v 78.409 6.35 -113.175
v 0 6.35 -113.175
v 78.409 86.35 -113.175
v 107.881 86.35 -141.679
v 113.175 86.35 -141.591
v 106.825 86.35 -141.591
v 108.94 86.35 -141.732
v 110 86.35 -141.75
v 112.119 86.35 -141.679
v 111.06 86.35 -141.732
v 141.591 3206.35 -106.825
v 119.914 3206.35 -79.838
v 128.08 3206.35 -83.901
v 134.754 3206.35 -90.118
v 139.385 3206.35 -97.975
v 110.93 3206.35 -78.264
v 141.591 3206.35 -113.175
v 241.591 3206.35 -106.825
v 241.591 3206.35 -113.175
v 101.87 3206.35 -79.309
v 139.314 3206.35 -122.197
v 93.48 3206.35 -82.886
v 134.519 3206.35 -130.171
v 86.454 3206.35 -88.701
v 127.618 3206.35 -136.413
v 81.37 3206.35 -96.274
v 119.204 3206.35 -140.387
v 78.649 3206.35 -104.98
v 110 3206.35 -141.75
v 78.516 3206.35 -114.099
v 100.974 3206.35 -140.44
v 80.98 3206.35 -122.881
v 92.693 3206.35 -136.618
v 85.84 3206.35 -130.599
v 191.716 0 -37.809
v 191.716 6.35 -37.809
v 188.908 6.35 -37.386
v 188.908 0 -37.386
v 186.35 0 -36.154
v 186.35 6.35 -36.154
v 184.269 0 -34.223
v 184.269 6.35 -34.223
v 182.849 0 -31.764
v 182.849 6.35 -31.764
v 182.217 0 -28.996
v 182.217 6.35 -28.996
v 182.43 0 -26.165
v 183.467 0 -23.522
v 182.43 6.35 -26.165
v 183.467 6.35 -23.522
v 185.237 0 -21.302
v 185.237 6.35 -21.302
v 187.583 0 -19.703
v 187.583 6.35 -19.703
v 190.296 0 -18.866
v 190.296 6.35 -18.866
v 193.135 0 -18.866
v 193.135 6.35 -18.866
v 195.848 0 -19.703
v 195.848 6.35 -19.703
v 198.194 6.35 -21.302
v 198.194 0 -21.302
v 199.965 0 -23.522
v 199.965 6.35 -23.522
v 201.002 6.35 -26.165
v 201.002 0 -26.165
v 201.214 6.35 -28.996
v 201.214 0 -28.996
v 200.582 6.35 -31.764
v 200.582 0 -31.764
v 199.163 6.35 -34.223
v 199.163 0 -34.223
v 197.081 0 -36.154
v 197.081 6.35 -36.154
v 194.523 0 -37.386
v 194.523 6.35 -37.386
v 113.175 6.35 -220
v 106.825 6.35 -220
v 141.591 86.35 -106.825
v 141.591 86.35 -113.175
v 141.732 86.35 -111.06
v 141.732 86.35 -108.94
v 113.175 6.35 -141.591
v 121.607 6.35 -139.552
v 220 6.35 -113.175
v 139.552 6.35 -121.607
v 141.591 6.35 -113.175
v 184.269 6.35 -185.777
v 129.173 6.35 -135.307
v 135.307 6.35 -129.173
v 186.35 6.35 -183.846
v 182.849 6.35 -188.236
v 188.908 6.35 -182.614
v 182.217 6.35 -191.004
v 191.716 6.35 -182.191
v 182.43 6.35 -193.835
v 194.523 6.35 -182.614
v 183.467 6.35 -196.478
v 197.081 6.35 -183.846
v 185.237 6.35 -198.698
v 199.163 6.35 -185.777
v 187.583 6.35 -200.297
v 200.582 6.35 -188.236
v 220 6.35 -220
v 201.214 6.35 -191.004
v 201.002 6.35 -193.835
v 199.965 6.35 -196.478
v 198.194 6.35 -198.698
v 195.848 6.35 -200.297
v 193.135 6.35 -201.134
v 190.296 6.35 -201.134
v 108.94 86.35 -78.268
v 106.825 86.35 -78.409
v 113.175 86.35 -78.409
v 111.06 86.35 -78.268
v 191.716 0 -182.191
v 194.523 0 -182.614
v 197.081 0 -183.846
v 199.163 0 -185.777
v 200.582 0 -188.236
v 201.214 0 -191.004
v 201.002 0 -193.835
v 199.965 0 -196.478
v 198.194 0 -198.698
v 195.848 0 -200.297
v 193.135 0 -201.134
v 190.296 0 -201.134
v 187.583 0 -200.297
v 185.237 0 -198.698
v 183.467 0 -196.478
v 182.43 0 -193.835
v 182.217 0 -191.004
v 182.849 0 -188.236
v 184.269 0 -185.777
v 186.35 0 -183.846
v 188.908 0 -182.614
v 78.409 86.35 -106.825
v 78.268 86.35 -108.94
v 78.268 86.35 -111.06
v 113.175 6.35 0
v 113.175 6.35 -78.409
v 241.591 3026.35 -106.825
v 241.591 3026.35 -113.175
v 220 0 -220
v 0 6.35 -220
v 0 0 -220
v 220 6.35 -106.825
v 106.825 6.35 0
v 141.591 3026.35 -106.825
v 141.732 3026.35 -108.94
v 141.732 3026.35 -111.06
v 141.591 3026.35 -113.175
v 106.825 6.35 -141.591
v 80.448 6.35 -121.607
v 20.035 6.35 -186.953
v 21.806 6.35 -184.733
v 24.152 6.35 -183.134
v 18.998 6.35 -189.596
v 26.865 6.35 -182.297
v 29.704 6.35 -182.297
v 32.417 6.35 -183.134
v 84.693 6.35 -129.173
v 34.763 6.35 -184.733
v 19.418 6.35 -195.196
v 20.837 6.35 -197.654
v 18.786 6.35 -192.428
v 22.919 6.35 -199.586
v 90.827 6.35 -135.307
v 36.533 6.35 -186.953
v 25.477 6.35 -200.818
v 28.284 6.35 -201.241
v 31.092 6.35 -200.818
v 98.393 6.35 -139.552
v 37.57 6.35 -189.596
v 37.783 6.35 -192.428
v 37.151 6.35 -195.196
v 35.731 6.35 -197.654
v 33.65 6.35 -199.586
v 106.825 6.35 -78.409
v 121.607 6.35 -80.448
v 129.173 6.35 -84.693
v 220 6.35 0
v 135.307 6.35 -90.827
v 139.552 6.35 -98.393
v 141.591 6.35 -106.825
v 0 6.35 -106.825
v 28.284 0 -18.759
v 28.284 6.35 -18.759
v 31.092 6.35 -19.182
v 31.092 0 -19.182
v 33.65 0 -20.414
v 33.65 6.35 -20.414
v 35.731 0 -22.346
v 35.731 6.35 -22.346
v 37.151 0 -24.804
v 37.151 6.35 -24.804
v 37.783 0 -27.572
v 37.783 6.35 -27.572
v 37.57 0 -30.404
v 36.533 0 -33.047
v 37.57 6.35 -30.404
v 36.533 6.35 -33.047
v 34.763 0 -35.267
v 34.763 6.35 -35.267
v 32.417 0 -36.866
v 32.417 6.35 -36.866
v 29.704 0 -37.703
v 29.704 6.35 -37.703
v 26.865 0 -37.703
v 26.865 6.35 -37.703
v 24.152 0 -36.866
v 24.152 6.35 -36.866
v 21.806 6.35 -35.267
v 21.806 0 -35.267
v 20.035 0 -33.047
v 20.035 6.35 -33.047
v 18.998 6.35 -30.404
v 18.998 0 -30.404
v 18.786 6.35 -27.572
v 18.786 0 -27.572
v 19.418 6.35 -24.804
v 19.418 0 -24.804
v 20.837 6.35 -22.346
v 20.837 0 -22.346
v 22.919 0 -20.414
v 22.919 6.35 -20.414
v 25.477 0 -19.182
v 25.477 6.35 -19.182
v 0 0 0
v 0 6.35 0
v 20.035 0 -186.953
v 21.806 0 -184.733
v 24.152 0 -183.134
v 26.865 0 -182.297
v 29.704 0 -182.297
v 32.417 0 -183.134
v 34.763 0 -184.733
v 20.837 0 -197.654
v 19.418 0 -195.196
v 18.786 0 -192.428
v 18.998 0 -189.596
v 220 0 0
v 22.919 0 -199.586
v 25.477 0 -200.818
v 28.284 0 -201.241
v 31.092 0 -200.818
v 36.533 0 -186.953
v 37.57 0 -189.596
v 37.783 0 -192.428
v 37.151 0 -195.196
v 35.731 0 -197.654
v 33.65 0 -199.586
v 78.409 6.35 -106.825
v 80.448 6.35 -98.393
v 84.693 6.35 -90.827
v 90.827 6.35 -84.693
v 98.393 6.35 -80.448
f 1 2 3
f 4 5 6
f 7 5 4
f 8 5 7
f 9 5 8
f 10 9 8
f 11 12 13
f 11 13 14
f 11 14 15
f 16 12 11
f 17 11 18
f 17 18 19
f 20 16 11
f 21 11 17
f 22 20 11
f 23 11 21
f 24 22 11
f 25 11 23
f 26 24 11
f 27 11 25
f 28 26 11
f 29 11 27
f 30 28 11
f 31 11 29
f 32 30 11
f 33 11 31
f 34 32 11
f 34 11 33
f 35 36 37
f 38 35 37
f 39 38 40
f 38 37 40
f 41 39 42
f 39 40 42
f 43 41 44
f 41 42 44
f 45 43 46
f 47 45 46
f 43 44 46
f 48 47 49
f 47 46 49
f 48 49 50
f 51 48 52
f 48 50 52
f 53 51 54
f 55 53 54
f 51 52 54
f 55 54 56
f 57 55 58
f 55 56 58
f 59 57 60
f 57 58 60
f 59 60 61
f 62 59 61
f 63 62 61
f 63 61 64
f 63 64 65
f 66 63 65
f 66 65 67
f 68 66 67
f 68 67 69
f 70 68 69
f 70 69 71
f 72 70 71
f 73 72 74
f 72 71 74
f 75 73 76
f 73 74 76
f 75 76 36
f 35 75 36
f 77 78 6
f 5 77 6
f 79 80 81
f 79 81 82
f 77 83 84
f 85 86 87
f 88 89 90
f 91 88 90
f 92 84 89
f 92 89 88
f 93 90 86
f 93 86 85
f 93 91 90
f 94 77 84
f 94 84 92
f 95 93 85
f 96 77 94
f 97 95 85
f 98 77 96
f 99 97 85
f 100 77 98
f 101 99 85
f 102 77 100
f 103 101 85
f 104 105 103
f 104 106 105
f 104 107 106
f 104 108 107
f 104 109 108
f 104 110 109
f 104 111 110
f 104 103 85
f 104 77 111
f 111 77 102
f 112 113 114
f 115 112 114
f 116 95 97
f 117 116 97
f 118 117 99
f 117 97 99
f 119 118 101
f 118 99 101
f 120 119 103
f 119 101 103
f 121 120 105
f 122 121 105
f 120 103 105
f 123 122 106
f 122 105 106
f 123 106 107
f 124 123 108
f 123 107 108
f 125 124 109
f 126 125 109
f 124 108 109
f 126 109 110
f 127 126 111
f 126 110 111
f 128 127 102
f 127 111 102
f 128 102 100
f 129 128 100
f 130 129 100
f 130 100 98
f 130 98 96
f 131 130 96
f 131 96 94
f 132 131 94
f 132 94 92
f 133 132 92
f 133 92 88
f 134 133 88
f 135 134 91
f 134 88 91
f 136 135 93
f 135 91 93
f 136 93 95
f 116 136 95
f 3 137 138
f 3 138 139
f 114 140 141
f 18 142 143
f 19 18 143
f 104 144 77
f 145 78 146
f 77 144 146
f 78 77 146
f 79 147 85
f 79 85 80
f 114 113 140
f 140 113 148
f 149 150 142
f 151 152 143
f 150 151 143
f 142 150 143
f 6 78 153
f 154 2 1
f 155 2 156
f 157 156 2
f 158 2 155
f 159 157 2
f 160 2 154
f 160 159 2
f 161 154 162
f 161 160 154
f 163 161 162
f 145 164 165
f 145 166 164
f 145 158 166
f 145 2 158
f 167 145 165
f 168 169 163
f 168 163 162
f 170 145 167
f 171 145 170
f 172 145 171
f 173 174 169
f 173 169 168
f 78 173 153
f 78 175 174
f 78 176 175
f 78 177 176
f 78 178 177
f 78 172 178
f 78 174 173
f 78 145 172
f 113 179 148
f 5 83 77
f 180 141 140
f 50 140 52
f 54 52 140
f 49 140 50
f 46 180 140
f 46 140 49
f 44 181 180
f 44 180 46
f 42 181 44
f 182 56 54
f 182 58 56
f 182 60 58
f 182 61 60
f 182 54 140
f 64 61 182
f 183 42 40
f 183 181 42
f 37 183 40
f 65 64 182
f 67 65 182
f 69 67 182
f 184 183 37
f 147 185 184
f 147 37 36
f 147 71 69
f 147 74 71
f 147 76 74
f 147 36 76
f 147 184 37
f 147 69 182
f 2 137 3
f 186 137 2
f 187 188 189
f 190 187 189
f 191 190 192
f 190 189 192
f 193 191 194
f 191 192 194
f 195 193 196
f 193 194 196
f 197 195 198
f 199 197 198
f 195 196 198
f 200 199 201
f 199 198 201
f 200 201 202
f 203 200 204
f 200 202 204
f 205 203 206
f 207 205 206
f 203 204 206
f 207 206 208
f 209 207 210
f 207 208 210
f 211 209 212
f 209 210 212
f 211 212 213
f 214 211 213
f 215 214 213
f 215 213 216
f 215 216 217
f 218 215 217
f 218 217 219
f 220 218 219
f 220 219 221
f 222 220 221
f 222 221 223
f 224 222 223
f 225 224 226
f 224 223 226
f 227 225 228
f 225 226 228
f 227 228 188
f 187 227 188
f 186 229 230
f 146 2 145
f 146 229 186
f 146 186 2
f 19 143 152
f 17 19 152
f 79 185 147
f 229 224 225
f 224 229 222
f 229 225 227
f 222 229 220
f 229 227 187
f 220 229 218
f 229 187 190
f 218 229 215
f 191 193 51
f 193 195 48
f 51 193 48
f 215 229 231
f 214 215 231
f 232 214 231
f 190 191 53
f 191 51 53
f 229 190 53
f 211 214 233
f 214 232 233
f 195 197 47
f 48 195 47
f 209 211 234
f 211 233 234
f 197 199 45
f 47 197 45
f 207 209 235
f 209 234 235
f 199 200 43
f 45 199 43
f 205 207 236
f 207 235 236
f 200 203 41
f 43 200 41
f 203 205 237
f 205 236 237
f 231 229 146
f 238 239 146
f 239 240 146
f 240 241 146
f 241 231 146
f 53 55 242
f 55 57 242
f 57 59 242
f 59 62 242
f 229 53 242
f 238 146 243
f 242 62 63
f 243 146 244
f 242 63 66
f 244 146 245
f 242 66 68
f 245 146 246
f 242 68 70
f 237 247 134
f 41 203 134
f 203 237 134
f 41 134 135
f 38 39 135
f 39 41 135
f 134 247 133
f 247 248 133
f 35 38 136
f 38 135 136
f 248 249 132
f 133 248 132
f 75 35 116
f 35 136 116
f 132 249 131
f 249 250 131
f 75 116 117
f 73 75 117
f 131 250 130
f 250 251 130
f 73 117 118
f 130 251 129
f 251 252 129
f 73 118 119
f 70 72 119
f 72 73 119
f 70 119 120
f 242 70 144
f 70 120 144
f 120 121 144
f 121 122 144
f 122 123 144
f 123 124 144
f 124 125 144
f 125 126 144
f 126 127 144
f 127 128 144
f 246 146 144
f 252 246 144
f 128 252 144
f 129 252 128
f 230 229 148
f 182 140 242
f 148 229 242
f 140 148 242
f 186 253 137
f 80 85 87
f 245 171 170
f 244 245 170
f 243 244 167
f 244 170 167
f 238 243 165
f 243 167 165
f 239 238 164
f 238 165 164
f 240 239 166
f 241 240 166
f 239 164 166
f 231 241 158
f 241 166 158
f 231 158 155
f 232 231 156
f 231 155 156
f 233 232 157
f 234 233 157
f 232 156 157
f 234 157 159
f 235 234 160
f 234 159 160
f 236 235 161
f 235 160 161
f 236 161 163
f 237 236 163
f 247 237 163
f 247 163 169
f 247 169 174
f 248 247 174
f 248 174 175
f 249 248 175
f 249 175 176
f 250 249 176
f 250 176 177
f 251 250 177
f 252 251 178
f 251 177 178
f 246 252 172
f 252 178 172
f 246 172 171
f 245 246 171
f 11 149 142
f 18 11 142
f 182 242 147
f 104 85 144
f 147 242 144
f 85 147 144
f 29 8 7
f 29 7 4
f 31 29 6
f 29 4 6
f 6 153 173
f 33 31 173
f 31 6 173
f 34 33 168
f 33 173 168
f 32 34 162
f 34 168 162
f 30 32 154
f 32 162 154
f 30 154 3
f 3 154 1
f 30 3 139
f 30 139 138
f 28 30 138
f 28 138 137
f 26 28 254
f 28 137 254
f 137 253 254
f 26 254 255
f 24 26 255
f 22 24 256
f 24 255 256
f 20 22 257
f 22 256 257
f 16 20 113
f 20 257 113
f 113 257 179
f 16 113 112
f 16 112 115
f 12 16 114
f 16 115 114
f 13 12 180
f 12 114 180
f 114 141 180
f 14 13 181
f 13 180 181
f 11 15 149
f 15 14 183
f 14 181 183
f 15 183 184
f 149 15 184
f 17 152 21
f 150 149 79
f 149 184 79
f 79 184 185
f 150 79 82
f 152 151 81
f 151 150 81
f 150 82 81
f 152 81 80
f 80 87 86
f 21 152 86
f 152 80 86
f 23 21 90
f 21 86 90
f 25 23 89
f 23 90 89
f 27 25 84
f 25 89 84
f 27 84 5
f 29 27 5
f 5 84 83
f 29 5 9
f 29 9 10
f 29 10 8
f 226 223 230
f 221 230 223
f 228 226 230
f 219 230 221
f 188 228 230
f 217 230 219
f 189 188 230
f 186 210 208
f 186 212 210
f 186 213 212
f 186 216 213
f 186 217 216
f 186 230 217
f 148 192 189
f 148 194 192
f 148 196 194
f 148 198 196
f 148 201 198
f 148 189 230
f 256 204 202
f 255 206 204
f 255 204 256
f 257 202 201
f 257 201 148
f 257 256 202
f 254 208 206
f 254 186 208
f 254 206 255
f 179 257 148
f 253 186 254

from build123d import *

# Parameters (mm, degrees)
CROQUIS1_W              = 220
CROQUIS1_H              = 220
SALIENTE_EXTRUIR1_DEPTH = 6.35
CROQUIS2_R              = 31.75
SALIENTE_EXTRUIR2_DEPTH = 3200
SALIENTE_EXTRUIR3_DEPTH = 80
CORTAR_EXTRUIR1_DEPTH   = 6.35
CORTAR_EXTRUIR2_DEPTH   = 6.35
CROQUIS6_R              = 9.525
CORTAR_EXTRUIR3_DEPTH   = 6.35
SALIENTE_EXTRUIR4_START = -180
SALIENTE_EXTRUIR4_DEPTH = 180


with BuildPart() as part:
    # Croquis1 → Saliente-Extruir1 (new body)
    with BuildSketch(Plane(origin=(0, 0, 0), x_dir=(1, 0, 0), z_dir=(0, 1, 0))):
        with Locations((110, 110)):
            Rectangle(CROQUIS1_W, CROQUIS1_H)
    extrude(amount=SALIENTE_EXTRUIR1_DEPTH)

    # Croquis2 → Saliente-Extruir2 (add)
    with BuildSketch(Plane(origin=(0, 6.35, 0), x_dir=(1, 0, 0), z_dir=(0, 1, 0))):
        with Locations(Location((110, 110, 0), (0, 0, 90))):
            Circle(CROQUIS2_R)
    extrude(amount=SALIENTE_EXTRUIR2_DEPTH)

    # Croquis3 → Saliente-Extruir3 (add)
    with BuildSketch(Plane(origin=(0, 6.35, 0), x_dir=(1, 0, 0), z_dir=(0, 1, 0))):
        with BuildLine():
            Line((0, 113.175), (78.409148872, 113.175))
            ThreePointArc((78.409148872, 113.175), (78.25, 110), (78.409148872, 106.825))
            Line((78.409148872, 106.825), (0, 106.825))
            Line((0, 106.825), (0, 113.175))
        make_face()
        with BuildLine():
            Line((106.825, 220), (106.825, 141.590851128))
            ThreePointArc((106.825, 141.590851128), (110, 141.75), (113.175, 141.590851128))
            Line((113.175, 141.590851128), (113.175, 220))
            Line((113.175, 220), (106.825, 220))
        make_face()
        with BuildLine():
            Line((106.825, 0), (113.175, 0))
            Line((113.175, 0), (113.175, 78.409148872))
            ThreePointArc((113.175, 78.409148872), (110, 78.25), (106.825, 78.409148872))
            Line((106.825, 78.409148872), (106.825, 0))
        make_face()
        with BuildLine():
            Line((220, 106.825), (220, 113.175))
            Line((220, 113.175), (141.590851128, 113.175))
            ThreePointArc((141.590851128, 113.175), (141.75, 110), (141.590851128, 106.825))
            Line((141.590851128, 106.825), (220, 106.825))
        make_face()
    extrude(amount=SALIENTE_EXTRUIR3_DEPTH)

    # Croquis4 → Cortar-Extruir1 (cut)
    with BuildSketch(Plane.XY.offset(-106.825)):
        Polygon((78.409148872, 86.35), (0, 6.35), (0, 86.35), align=None)
        Polygon((141.590851128, 86.35), (220, 86.35), (220, 6.35), align=None)
    extrude(amount=-CORTAR_EXTRUIR1_DEPTH, mode=Mode.SUBTRACT)

    # Croquis5 → Cortar-Extruir2 (cut)
    with BuildSketch(Plane.ZY.offset(-106.825)):
        Polygon((-220, 6.35), (-141.590851128, 86.35), (-220, 86.35), align=None)
        Polygon((-78.409148872, 86.35), (0, 6.35), (0, 86.35), align=None)
    extrude(amount=-CORTAR_EXTRUIR2_DEPTH, mode=Mode.SUBTRACT)

    # Croquis6 → Cortar-Extruir3 (cut)
    with BuildSketch(Plane(origin=(0, 6.35, 0), x_dir=(1, 0, 0), z_dir=(0, 1, 0))):
        with Locations(Location((191.715728753, 191.715728753, 0), (0, 0, 270))):
            Circle(CROQUIS6_R)
        with Locations(Location((191.715728753, 28.284271247, 0), (0, 0, 90))):
            Circle(CROQUIS6_R)
        with Locations(Location((28.284271247, 28.284271247, 0), (0, 0, 270))):
            Circle(CROQUIS6_R)
        with Locations(Location((28.284271247, 191.715728753, 0), (0, 0, 90))):
            Circle(CROQUIS6_R)
    extrude(amount=-CORTAR_EXTRUIR3_DEPTH, mode=Mode.SUBTRACT)

    # Croquis7 → Saliente-Extruir4 (add)
    with BuildSketch(Plane(origin=(0, 3206.35, 0), x_dir=(1, 0, 0), z_dir=(0, 1, 0)).offset(SALIENTE_EXTRUIR4_START)):
        with BuildLine():
            Line((241.590851128, 113.175), (141.590851128, 113.175))
            ThreePointArc((141.590851128, 113.175), (141.75, 110), (141.590851128, 106.825))
            Line((141.590851128, 106.825), (241.590851128, 106.825))
            Line((241.590851128, 106.825), (241.590851128, 113.175))
        make_face()
    extrude(amount=SALIENTE_EXTRUIR4_DEPTH)


solid = part.part
